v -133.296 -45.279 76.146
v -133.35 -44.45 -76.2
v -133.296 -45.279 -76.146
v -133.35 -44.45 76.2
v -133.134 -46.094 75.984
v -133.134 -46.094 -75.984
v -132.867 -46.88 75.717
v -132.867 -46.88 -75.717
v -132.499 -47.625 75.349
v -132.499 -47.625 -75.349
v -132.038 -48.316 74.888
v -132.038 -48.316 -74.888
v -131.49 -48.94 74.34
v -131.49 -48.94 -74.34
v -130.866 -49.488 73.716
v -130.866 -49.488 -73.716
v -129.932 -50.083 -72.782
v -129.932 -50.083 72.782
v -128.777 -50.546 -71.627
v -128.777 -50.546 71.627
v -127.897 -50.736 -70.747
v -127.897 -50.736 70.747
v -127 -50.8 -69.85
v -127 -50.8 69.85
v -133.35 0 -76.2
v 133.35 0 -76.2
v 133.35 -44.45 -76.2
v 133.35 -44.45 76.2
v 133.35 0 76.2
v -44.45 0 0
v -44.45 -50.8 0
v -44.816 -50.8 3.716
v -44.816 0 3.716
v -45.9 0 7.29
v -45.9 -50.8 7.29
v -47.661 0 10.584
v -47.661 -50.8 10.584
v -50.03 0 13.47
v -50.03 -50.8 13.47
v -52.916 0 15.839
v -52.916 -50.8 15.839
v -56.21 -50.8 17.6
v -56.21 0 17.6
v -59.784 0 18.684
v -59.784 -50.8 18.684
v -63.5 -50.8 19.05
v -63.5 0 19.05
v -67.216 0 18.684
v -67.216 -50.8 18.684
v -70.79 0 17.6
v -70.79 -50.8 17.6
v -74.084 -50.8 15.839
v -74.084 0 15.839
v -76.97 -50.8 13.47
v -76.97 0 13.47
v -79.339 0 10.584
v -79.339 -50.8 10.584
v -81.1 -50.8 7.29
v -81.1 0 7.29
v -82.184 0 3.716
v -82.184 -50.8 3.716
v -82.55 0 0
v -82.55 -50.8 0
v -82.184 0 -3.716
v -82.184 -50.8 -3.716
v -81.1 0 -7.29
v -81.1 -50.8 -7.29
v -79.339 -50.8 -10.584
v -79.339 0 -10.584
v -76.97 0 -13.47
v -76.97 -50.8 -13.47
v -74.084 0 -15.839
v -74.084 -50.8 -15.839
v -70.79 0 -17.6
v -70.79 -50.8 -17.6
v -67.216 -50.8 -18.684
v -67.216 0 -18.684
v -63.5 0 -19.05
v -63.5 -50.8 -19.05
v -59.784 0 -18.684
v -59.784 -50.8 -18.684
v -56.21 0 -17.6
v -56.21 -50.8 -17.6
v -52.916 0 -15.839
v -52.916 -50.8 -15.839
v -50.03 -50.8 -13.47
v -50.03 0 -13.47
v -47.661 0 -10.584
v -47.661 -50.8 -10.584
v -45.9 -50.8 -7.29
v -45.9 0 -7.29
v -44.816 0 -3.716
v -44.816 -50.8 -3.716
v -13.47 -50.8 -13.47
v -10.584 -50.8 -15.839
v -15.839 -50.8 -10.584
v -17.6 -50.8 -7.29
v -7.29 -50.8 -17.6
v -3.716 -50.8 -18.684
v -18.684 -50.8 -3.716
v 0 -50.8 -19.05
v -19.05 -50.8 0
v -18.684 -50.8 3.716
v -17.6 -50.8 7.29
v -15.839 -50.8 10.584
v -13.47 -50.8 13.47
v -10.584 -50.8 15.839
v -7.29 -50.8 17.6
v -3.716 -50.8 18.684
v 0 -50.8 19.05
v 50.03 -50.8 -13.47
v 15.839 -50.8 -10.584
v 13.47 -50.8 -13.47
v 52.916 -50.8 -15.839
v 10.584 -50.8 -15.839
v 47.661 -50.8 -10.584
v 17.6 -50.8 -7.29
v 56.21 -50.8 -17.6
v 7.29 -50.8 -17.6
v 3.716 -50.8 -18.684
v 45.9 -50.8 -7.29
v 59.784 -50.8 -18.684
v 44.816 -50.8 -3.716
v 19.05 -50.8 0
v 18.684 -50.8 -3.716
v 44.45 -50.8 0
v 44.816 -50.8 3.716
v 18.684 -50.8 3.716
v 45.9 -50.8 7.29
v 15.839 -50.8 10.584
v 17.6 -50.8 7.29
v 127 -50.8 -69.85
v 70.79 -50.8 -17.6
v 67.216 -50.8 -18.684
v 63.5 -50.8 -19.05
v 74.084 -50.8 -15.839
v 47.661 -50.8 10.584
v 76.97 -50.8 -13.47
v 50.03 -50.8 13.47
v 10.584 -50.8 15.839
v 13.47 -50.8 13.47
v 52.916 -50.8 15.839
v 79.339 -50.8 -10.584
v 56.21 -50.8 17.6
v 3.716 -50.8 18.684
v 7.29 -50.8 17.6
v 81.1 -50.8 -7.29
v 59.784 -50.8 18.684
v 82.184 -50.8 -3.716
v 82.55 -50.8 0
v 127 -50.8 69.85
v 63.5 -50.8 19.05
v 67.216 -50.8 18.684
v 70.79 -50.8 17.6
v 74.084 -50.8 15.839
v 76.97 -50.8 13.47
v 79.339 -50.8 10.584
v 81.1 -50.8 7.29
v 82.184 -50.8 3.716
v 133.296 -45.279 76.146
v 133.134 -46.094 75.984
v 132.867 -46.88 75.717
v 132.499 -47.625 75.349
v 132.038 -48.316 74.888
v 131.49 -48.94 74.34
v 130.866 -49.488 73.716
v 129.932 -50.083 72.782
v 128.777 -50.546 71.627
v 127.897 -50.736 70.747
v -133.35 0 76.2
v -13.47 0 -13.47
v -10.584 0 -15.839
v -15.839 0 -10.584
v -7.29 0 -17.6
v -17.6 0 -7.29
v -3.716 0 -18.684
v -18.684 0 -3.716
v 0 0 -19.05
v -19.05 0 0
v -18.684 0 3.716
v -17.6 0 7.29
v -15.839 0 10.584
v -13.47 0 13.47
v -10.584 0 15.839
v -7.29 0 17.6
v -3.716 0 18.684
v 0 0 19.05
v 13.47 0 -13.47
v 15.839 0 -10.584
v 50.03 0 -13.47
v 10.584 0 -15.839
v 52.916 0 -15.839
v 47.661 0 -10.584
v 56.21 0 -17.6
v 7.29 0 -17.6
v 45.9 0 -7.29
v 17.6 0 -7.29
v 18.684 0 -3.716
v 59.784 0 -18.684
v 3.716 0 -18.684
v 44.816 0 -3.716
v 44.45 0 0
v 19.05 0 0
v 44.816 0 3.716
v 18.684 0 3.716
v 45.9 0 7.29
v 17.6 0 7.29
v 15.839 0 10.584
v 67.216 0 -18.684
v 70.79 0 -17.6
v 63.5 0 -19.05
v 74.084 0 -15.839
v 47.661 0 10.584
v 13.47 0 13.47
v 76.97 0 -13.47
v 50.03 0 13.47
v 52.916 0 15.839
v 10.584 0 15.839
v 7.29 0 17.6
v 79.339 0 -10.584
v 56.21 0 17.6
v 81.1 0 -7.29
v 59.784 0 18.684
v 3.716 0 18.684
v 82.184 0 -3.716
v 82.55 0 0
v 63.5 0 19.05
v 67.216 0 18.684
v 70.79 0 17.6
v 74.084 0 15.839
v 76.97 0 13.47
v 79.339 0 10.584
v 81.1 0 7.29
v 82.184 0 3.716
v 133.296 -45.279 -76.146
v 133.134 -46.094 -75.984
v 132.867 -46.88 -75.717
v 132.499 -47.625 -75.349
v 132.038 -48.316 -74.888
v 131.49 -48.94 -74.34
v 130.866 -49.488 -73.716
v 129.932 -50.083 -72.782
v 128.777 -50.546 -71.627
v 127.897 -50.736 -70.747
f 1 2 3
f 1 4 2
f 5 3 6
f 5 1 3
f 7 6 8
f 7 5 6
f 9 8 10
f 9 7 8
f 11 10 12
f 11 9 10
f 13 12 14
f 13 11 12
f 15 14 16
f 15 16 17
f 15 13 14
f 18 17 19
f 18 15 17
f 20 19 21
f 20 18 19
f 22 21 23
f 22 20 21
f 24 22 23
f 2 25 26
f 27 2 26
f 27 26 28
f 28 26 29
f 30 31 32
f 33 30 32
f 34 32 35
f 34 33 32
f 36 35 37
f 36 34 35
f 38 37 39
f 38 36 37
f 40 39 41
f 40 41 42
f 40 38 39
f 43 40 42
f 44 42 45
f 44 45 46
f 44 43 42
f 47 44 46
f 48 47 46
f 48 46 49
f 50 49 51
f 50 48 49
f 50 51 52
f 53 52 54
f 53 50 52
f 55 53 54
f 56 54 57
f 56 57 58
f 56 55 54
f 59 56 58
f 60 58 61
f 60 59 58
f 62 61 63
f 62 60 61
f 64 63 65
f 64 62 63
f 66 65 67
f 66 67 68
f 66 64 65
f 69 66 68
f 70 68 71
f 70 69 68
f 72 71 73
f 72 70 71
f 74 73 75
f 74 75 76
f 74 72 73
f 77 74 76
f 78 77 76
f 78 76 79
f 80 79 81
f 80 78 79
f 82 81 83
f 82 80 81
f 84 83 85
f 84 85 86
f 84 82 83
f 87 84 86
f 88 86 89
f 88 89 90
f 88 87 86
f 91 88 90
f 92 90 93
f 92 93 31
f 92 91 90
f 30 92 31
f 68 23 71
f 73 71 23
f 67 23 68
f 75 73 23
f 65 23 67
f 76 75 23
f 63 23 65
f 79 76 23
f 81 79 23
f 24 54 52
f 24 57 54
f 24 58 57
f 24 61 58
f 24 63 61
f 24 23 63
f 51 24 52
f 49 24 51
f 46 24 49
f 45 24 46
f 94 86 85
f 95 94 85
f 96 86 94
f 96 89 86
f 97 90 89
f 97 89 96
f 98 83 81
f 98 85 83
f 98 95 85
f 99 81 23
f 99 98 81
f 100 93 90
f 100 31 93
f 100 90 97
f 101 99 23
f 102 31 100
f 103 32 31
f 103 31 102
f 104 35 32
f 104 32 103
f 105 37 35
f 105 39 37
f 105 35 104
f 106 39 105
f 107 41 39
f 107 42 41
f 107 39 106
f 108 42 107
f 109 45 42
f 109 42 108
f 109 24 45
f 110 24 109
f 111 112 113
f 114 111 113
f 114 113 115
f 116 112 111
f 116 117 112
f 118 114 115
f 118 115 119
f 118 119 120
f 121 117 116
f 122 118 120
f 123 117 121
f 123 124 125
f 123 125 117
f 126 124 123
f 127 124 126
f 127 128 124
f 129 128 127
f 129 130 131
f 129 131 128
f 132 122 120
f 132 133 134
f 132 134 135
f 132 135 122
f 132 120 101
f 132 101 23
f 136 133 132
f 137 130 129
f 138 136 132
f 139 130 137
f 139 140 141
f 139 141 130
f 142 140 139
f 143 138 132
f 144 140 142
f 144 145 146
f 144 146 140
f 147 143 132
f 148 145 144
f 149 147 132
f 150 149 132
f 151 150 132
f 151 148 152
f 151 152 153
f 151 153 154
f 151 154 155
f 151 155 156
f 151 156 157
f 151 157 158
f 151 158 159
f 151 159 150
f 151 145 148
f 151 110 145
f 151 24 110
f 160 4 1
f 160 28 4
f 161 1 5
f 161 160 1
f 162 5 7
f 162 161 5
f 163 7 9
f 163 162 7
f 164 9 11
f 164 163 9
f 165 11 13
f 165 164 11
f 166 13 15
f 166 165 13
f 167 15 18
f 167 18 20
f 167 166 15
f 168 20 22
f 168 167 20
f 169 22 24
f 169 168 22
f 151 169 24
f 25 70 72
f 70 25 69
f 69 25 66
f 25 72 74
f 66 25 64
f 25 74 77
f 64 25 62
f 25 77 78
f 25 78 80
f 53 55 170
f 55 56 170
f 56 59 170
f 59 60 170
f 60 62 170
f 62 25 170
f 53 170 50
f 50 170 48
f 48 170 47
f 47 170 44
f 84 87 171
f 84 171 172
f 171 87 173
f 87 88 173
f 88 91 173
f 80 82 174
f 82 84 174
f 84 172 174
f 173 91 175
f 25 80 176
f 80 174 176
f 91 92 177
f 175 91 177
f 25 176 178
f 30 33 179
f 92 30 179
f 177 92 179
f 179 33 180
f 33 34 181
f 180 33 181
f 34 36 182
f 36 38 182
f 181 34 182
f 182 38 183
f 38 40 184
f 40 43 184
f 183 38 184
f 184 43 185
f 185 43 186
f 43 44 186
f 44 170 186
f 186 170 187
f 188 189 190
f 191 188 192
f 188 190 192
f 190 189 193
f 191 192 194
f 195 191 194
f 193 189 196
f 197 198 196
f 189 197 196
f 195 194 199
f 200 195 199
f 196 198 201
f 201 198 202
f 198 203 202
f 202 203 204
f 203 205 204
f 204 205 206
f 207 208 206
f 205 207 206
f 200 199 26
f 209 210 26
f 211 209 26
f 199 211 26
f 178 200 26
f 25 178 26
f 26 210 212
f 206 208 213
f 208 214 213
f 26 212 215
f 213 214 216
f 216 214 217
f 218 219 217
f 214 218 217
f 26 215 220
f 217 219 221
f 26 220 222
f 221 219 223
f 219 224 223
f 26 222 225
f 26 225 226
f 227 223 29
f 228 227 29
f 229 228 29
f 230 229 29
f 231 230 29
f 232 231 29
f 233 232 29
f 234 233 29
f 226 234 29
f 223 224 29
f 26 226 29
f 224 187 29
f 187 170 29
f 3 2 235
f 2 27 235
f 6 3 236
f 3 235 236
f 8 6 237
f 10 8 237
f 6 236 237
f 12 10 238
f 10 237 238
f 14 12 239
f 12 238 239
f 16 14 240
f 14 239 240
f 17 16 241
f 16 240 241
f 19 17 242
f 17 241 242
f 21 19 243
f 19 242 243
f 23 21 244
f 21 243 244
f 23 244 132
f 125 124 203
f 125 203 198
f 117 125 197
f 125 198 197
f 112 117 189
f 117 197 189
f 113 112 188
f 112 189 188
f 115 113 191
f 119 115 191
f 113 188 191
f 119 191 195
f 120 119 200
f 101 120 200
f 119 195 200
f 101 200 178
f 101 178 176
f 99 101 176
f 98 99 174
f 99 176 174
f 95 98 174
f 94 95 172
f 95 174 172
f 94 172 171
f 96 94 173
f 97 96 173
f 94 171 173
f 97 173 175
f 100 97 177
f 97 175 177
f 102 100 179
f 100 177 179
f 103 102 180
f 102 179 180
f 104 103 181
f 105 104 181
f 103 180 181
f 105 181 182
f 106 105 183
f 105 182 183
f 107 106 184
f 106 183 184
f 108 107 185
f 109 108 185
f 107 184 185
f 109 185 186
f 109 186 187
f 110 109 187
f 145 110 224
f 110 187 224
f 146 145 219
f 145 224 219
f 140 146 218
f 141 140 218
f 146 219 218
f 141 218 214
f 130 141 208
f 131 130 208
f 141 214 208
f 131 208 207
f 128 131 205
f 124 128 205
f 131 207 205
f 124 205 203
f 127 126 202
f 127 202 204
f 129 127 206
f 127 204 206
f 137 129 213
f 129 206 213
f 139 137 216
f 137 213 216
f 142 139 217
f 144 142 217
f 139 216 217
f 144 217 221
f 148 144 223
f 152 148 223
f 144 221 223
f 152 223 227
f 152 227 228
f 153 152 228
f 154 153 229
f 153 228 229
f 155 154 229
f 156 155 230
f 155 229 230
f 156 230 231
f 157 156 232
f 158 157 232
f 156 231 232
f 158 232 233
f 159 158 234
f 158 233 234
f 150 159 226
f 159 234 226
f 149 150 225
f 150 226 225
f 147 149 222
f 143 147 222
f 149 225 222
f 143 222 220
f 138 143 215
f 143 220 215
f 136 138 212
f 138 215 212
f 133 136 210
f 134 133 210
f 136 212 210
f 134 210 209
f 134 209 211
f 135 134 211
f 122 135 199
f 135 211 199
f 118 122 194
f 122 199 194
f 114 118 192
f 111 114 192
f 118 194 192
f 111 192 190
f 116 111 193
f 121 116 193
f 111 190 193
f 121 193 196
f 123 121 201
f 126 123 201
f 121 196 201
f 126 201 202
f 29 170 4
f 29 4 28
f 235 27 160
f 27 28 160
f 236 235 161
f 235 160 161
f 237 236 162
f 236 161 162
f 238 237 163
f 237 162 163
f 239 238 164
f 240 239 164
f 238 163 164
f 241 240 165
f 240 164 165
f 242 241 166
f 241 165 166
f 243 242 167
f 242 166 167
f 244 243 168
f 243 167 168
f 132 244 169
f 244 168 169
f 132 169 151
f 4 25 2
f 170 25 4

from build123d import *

# Parameters (mm, degrees)
F0_W     = 266.7
F0_H     = 152.4
F0_R     = 19.05
F1_DEPTH = 50.8
F2_R     = 6.35


with BuildPart() as f1:
    # F0 (on Front) → F1 (new body)
    with BuildSketch(Plane.XZ):
        Rectangle(F0_W, F0_H)
        with Locations((-63.5, 0)):
            Circle(F0_R, mode=Mode.SUBTRACT)
        with BuildLine():
            ThreePointArc((-19.05, 0), (0, 19.05), (19.05, 0))
            ThreePointArc((19.05, 0), (0, -19.05), (-19.05, 0))
        make_face(mode=Mode.SUBTRACT)
        with BuildLine():
            ThreePointArc((82.55, 0), (63.5, -19.05), (44.45, 0))
            ThreePointArc((44.45, 0), (63.5, 19.05), (82.55, 0))
        make_face(mode=Mode.SUBTRACT)
    extrude(amount=F1_DEPTH)

    # F2
    f2_edges = [f1.edges().sort_by_distance(p)[0] for p in [
        (0, -50.8, 76.2),
        (-133.35, -50.8, 0),
        (0, -50.8, -76.2),
        (133.35, -50.8, 0),
    ]]
    fillet(f2_edges, radius=F2_R)


solid = f1.part
